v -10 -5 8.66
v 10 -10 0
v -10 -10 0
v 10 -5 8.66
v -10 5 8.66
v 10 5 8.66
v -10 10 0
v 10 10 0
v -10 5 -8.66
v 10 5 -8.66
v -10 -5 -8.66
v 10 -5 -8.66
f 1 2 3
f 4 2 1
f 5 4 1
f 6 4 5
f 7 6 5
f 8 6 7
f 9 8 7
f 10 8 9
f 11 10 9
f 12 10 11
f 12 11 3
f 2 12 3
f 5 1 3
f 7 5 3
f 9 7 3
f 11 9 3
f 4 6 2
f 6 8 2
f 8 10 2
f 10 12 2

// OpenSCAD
$fa=5;$fs=0.01;


polyhedron(faces = [[0, 6, 1], [1, 6, 7], [1, 7, 2], [2, 7, 8], [2, 8, 3], [3, 8, 9], [3, 9, 4], [4, 9, 10], [4, 10, 5], [5, 10, 11], [0, 5, 11], [0, 11, 6], [0, 1, 2], [0, 2, 3], [0, 3, 4], [0, 4, 5], [6, 8, 7], [6, 9, 8], [6, 10, 9], [6, 11, 10]], points = [[-10.0000000000, -10.0000000000, 0.0000000000], [-10.0000000000, -5.0000000000, 8.6602540378], [-10.0000000000, 5.0000000000, 8.6602540378], [-10.0000000000, 10.0000000000, 0.0000000000], [-10.0000000000, 5.0000000000, -8.6602540378], [-10.0000000000, -5.0000000000, -8.6602540378], [10.0000000000, -10.0000000000, 0.0000000000], [10.0000000000, -5.0000000000, 8.6602540378], [10.0000000000, 5.0000000000, 8.6602540378], [10.0000000000, 10.0000000000, 0.0000000000], [10.0000000000, 5.0000000000, -8.6602540378], [10.0000000000, -5.0000000000, -8.6602540378]]);
